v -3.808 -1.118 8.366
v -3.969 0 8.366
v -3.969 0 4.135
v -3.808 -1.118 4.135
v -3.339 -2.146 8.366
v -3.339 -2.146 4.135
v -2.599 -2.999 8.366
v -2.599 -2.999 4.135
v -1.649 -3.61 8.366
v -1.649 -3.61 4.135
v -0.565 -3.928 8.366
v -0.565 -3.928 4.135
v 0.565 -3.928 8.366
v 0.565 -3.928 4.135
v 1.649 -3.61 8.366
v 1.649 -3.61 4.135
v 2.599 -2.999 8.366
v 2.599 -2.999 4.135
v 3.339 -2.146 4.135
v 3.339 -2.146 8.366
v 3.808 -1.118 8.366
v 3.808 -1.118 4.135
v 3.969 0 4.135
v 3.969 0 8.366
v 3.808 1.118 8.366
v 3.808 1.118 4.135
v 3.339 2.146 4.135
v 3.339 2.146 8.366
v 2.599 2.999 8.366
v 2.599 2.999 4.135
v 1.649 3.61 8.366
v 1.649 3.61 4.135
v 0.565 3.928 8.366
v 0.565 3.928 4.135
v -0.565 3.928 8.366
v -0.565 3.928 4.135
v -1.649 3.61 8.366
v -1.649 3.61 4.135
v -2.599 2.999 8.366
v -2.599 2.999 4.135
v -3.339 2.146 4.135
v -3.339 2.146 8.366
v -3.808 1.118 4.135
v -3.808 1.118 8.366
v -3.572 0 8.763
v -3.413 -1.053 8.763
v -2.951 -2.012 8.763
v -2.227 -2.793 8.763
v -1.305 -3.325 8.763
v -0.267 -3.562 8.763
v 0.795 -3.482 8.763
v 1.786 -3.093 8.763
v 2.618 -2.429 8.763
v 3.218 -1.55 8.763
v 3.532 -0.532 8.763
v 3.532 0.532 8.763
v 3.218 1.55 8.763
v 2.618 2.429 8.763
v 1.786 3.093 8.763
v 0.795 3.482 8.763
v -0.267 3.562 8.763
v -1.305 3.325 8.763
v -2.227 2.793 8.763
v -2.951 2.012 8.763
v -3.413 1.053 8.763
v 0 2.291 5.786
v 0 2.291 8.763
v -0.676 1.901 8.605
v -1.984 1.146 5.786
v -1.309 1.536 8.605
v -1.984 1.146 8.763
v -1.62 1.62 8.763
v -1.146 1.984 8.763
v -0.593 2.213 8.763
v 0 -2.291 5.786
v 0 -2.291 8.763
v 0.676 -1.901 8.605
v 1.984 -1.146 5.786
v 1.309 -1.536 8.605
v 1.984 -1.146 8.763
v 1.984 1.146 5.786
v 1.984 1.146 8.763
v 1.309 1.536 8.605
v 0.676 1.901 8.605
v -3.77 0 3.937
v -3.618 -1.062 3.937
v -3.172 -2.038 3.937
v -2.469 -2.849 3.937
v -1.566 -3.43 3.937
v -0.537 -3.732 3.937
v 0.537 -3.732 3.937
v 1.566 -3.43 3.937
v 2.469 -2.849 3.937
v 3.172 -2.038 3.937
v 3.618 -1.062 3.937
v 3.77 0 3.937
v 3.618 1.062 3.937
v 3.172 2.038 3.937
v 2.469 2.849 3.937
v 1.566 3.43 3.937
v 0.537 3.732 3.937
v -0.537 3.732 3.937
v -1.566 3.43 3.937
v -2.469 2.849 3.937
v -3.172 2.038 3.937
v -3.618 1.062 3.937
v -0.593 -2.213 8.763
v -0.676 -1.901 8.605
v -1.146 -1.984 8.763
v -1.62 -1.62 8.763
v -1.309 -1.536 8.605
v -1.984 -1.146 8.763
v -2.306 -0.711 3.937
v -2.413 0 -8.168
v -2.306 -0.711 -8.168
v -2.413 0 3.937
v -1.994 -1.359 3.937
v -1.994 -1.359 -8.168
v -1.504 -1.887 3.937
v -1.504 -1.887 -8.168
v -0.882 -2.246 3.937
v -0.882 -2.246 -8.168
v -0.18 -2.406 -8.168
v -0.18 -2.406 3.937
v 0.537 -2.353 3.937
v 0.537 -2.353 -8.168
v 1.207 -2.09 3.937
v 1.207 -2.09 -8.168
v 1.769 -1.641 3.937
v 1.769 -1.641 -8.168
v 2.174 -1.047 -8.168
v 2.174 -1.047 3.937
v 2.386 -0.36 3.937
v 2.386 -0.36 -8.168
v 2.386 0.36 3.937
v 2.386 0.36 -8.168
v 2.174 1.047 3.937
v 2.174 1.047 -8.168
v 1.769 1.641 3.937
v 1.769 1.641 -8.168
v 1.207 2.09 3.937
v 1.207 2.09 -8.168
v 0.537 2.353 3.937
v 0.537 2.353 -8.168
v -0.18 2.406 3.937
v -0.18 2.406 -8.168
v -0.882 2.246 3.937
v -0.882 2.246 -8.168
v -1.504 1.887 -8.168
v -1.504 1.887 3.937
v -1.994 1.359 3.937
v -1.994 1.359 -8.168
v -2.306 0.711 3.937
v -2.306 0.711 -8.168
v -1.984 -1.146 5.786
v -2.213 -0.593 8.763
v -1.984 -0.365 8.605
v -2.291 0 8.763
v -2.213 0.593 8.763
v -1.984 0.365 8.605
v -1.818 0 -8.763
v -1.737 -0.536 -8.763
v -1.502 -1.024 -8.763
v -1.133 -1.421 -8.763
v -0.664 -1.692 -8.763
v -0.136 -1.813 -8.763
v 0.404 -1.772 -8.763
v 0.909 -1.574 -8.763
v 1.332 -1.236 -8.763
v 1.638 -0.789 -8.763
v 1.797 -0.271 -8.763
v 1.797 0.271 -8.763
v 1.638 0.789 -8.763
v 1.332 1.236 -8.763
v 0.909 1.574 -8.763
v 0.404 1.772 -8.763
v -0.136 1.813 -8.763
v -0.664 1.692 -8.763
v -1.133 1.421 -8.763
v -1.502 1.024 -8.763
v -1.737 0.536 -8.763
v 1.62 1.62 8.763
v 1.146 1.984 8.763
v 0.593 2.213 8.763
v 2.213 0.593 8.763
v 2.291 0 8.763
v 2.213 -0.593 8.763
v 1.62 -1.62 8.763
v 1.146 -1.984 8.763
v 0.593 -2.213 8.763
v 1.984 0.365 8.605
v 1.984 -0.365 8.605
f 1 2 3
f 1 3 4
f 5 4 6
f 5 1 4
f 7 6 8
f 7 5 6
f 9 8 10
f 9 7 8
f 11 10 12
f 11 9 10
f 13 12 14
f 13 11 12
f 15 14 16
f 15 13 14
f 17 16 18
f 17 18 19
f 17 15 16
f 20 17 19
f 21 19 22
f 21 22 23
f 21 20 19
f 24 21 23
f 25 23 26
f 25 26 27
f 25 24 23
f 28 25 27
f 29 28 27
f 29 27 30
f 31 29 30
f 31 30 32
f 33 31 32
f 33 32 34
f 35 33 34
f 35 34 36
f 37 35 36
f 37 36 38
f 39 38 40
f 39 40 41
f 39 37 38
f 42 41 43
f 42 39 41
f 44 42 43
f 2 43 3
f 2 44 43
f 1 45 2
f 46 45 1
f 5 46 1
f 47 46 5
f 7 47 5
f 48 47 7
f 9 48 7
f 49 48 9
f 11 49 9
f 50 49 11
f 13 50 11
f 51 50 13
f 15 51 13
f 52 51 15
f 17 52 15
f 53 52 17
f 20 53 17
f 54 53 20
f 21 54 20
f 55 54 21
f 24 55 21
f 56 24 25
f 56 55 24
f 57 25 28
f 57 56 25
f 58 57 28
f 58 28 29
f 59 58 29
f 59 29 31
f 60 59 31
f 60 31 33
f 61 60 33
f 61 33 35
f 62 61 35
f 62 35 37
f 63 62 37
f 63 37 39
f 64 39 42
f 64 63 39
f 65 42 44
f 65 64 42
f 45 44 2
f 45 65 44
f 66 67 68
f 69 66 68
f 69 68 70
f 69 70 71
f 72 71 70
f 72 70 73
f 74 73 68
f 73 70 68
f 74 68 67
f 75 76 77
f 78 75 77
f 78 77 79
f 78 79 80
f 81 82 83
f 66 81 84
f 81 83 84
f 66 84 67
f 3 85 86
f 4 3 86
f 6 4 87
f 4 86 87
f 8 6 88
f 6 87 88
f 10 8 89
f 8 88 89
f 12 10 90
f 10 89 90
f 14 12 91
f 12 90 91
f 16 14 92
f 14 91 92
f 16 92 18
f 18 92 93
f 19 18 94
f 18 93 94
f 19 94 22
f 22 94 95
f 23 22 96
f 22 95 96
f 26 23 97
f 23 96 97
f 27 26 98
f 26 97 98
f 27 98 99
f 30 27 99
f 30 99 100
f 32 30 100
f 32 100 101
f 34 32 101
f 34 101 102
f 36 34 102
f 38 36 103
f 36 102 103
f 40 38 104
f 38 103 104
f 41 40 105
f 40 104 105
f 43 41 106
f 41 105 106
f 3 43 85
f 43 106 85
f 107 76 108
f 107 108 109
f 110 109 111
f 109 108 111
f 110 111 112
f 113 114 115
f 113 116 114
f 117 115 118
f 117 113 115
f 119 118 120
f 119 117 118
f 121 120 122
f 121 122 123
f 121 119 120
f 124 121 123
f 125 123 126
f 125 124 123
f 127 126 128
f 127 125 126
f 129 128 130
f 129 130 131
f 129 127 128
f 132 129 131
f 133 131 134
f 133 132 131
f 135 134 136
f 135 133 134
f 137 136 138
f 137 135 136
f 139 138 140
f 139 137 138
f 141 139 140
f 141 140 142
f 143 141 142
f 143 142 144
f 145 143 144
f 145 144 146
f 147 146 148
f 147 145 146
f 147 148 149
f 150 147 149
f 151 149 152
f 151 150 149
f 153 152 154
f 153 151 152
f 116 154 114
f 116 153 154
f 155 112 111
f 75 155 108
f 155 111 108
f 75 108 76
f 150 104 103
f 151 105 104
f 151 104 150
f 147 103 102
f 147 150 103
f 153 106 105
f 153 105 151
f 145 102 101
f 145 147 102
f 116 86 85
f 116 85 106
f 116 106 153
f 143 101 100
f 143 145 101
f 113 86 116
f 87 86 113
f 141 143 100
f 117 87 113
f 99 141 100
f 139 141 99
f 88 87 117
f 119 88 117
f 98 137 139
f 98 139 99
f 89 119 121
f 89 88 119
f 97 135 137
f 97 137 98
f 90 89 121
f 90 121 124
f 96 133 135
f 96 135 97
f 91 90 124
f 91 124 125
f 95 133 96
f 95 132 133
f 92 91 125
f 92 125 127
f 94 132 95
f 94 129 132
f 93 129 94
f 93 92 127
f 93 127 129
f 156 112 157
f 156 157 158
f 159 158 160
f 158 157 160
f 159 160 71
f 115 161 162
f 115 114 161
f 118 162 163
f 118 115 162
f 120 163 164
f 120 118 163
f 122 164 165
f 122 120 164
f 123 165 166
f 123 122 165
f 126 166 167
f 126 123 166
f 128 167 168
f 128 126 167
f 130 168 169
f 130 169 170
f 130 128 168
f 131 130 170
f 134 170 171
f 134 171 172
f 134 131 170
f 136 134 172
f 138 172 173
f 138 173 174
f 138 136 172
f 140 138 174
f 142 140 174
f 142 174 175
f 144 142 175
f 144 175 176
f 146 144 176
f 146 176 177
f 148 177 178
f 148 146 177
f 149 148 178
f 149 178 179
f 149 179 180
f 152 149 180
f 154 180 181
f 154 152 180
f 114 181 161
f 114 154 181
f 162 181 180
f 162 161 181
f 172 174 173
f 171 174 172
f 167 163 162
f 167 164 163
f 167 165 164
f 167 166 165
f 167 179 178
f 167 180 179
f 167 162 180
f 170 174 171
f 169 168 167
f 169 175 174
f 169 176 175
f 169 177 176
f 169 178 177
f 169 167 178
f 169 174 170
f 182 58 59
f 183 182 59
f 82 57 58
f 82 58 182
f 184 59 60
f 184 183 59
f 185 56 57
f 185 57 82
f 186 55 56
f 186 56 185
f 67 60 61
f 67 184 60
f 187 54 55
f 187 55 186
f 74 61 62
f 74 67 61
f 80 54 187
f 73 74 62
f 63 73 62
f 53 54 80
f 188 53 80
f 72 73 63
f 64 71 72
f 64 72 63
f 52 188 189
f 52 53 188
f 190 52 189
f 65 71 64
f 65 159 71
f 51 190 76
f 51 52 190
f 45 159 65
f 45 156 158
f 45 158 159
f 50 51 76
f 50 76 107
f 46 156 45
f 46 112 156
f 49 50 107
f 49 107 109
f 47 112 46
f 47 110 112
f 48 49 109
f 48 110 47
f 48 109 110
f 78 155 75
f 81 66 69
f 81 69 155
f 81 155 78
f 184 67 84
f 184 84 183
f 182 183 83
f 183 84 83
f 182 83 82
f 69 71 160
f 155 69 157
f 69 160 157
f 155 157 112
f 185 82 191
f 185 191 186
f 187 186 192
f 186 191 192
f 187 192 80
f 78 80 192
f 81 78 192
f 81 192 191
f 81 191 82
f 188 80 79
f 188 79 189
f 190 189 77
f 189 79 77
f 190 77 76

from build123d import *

# Parameters (mm, degrees)
CUT_EXTRUDE1_DEPTH = 2.9765625
CHAMFER1_SIZE      = 0.396875
CHAMFER2_SIZE      = 0.1984375


with BuildPart() as part:
    # Sketch2 → Revolve1 (revolve)
    with BuildSketch(Plane(origin=(0, 0, 0), x_dir=(0, 0, -1), z_dir=(1, 0, 0))):
        Polygon((8.763, 1.8176875), (8.1676875, 2.413), (-3.937, 2.413), (-3.937, 3.96875), (-8.763, 3.96875), (-8.763, 0), (8.763, 0), align=None)
    revolve(axis=Axis((0, 0, -8.763), (0, 0, 1)))

    # Sketch4 → Cut-Extrude1 (cut)
    with BuildSketch(Plane.XY.offset(8.763)):
        Polygon((0, 2.291358881), (-1.984375, 1.14567944), (-1.984375, -1.14567944), (0, -2.291358881), (1.984375, -1.14567944), (1.984375, 1.14567944), align=None)
    extrude(amount=-CUT_EXTRUDE1_DEPTH, mode=Mode.SUBTRACT)

    # Cut-Extrude2 cone 1 section (through the dimple's axis) → Cut-Extrude2 (revolve, cut)
    with BuildSketch(Plane(origin=(0, 0, 8.763), x_dir=(0, -1, 0), z_dir=(1, 0, 0))):
        Polygon((0, 0), (2.291358881, 0), (0, 1.322916667), align=None)
    revolve(axis=Axis((0, 0, 8.763), (0, 0, -1)), mode=Mode.SUBTRACT)

    # Chamfer1
    chamfer1_edges = [part.edges().sort_by_distance(p)[0] for p in [
        (0, -3.96875, 8.763),
    ]]
    chamfer(chamfer1_edges, length=CHAMFER1_SIZE)

    # Chamfer2
    chamfer2_edges = [part.edges().sort_by_distance(p)[0] for p in [
        (0, -3.96875, 3.937),
    ]]
    chamfer(chamfer2_edges, length=CHAMFER2_SIZE)


solid = part.part
